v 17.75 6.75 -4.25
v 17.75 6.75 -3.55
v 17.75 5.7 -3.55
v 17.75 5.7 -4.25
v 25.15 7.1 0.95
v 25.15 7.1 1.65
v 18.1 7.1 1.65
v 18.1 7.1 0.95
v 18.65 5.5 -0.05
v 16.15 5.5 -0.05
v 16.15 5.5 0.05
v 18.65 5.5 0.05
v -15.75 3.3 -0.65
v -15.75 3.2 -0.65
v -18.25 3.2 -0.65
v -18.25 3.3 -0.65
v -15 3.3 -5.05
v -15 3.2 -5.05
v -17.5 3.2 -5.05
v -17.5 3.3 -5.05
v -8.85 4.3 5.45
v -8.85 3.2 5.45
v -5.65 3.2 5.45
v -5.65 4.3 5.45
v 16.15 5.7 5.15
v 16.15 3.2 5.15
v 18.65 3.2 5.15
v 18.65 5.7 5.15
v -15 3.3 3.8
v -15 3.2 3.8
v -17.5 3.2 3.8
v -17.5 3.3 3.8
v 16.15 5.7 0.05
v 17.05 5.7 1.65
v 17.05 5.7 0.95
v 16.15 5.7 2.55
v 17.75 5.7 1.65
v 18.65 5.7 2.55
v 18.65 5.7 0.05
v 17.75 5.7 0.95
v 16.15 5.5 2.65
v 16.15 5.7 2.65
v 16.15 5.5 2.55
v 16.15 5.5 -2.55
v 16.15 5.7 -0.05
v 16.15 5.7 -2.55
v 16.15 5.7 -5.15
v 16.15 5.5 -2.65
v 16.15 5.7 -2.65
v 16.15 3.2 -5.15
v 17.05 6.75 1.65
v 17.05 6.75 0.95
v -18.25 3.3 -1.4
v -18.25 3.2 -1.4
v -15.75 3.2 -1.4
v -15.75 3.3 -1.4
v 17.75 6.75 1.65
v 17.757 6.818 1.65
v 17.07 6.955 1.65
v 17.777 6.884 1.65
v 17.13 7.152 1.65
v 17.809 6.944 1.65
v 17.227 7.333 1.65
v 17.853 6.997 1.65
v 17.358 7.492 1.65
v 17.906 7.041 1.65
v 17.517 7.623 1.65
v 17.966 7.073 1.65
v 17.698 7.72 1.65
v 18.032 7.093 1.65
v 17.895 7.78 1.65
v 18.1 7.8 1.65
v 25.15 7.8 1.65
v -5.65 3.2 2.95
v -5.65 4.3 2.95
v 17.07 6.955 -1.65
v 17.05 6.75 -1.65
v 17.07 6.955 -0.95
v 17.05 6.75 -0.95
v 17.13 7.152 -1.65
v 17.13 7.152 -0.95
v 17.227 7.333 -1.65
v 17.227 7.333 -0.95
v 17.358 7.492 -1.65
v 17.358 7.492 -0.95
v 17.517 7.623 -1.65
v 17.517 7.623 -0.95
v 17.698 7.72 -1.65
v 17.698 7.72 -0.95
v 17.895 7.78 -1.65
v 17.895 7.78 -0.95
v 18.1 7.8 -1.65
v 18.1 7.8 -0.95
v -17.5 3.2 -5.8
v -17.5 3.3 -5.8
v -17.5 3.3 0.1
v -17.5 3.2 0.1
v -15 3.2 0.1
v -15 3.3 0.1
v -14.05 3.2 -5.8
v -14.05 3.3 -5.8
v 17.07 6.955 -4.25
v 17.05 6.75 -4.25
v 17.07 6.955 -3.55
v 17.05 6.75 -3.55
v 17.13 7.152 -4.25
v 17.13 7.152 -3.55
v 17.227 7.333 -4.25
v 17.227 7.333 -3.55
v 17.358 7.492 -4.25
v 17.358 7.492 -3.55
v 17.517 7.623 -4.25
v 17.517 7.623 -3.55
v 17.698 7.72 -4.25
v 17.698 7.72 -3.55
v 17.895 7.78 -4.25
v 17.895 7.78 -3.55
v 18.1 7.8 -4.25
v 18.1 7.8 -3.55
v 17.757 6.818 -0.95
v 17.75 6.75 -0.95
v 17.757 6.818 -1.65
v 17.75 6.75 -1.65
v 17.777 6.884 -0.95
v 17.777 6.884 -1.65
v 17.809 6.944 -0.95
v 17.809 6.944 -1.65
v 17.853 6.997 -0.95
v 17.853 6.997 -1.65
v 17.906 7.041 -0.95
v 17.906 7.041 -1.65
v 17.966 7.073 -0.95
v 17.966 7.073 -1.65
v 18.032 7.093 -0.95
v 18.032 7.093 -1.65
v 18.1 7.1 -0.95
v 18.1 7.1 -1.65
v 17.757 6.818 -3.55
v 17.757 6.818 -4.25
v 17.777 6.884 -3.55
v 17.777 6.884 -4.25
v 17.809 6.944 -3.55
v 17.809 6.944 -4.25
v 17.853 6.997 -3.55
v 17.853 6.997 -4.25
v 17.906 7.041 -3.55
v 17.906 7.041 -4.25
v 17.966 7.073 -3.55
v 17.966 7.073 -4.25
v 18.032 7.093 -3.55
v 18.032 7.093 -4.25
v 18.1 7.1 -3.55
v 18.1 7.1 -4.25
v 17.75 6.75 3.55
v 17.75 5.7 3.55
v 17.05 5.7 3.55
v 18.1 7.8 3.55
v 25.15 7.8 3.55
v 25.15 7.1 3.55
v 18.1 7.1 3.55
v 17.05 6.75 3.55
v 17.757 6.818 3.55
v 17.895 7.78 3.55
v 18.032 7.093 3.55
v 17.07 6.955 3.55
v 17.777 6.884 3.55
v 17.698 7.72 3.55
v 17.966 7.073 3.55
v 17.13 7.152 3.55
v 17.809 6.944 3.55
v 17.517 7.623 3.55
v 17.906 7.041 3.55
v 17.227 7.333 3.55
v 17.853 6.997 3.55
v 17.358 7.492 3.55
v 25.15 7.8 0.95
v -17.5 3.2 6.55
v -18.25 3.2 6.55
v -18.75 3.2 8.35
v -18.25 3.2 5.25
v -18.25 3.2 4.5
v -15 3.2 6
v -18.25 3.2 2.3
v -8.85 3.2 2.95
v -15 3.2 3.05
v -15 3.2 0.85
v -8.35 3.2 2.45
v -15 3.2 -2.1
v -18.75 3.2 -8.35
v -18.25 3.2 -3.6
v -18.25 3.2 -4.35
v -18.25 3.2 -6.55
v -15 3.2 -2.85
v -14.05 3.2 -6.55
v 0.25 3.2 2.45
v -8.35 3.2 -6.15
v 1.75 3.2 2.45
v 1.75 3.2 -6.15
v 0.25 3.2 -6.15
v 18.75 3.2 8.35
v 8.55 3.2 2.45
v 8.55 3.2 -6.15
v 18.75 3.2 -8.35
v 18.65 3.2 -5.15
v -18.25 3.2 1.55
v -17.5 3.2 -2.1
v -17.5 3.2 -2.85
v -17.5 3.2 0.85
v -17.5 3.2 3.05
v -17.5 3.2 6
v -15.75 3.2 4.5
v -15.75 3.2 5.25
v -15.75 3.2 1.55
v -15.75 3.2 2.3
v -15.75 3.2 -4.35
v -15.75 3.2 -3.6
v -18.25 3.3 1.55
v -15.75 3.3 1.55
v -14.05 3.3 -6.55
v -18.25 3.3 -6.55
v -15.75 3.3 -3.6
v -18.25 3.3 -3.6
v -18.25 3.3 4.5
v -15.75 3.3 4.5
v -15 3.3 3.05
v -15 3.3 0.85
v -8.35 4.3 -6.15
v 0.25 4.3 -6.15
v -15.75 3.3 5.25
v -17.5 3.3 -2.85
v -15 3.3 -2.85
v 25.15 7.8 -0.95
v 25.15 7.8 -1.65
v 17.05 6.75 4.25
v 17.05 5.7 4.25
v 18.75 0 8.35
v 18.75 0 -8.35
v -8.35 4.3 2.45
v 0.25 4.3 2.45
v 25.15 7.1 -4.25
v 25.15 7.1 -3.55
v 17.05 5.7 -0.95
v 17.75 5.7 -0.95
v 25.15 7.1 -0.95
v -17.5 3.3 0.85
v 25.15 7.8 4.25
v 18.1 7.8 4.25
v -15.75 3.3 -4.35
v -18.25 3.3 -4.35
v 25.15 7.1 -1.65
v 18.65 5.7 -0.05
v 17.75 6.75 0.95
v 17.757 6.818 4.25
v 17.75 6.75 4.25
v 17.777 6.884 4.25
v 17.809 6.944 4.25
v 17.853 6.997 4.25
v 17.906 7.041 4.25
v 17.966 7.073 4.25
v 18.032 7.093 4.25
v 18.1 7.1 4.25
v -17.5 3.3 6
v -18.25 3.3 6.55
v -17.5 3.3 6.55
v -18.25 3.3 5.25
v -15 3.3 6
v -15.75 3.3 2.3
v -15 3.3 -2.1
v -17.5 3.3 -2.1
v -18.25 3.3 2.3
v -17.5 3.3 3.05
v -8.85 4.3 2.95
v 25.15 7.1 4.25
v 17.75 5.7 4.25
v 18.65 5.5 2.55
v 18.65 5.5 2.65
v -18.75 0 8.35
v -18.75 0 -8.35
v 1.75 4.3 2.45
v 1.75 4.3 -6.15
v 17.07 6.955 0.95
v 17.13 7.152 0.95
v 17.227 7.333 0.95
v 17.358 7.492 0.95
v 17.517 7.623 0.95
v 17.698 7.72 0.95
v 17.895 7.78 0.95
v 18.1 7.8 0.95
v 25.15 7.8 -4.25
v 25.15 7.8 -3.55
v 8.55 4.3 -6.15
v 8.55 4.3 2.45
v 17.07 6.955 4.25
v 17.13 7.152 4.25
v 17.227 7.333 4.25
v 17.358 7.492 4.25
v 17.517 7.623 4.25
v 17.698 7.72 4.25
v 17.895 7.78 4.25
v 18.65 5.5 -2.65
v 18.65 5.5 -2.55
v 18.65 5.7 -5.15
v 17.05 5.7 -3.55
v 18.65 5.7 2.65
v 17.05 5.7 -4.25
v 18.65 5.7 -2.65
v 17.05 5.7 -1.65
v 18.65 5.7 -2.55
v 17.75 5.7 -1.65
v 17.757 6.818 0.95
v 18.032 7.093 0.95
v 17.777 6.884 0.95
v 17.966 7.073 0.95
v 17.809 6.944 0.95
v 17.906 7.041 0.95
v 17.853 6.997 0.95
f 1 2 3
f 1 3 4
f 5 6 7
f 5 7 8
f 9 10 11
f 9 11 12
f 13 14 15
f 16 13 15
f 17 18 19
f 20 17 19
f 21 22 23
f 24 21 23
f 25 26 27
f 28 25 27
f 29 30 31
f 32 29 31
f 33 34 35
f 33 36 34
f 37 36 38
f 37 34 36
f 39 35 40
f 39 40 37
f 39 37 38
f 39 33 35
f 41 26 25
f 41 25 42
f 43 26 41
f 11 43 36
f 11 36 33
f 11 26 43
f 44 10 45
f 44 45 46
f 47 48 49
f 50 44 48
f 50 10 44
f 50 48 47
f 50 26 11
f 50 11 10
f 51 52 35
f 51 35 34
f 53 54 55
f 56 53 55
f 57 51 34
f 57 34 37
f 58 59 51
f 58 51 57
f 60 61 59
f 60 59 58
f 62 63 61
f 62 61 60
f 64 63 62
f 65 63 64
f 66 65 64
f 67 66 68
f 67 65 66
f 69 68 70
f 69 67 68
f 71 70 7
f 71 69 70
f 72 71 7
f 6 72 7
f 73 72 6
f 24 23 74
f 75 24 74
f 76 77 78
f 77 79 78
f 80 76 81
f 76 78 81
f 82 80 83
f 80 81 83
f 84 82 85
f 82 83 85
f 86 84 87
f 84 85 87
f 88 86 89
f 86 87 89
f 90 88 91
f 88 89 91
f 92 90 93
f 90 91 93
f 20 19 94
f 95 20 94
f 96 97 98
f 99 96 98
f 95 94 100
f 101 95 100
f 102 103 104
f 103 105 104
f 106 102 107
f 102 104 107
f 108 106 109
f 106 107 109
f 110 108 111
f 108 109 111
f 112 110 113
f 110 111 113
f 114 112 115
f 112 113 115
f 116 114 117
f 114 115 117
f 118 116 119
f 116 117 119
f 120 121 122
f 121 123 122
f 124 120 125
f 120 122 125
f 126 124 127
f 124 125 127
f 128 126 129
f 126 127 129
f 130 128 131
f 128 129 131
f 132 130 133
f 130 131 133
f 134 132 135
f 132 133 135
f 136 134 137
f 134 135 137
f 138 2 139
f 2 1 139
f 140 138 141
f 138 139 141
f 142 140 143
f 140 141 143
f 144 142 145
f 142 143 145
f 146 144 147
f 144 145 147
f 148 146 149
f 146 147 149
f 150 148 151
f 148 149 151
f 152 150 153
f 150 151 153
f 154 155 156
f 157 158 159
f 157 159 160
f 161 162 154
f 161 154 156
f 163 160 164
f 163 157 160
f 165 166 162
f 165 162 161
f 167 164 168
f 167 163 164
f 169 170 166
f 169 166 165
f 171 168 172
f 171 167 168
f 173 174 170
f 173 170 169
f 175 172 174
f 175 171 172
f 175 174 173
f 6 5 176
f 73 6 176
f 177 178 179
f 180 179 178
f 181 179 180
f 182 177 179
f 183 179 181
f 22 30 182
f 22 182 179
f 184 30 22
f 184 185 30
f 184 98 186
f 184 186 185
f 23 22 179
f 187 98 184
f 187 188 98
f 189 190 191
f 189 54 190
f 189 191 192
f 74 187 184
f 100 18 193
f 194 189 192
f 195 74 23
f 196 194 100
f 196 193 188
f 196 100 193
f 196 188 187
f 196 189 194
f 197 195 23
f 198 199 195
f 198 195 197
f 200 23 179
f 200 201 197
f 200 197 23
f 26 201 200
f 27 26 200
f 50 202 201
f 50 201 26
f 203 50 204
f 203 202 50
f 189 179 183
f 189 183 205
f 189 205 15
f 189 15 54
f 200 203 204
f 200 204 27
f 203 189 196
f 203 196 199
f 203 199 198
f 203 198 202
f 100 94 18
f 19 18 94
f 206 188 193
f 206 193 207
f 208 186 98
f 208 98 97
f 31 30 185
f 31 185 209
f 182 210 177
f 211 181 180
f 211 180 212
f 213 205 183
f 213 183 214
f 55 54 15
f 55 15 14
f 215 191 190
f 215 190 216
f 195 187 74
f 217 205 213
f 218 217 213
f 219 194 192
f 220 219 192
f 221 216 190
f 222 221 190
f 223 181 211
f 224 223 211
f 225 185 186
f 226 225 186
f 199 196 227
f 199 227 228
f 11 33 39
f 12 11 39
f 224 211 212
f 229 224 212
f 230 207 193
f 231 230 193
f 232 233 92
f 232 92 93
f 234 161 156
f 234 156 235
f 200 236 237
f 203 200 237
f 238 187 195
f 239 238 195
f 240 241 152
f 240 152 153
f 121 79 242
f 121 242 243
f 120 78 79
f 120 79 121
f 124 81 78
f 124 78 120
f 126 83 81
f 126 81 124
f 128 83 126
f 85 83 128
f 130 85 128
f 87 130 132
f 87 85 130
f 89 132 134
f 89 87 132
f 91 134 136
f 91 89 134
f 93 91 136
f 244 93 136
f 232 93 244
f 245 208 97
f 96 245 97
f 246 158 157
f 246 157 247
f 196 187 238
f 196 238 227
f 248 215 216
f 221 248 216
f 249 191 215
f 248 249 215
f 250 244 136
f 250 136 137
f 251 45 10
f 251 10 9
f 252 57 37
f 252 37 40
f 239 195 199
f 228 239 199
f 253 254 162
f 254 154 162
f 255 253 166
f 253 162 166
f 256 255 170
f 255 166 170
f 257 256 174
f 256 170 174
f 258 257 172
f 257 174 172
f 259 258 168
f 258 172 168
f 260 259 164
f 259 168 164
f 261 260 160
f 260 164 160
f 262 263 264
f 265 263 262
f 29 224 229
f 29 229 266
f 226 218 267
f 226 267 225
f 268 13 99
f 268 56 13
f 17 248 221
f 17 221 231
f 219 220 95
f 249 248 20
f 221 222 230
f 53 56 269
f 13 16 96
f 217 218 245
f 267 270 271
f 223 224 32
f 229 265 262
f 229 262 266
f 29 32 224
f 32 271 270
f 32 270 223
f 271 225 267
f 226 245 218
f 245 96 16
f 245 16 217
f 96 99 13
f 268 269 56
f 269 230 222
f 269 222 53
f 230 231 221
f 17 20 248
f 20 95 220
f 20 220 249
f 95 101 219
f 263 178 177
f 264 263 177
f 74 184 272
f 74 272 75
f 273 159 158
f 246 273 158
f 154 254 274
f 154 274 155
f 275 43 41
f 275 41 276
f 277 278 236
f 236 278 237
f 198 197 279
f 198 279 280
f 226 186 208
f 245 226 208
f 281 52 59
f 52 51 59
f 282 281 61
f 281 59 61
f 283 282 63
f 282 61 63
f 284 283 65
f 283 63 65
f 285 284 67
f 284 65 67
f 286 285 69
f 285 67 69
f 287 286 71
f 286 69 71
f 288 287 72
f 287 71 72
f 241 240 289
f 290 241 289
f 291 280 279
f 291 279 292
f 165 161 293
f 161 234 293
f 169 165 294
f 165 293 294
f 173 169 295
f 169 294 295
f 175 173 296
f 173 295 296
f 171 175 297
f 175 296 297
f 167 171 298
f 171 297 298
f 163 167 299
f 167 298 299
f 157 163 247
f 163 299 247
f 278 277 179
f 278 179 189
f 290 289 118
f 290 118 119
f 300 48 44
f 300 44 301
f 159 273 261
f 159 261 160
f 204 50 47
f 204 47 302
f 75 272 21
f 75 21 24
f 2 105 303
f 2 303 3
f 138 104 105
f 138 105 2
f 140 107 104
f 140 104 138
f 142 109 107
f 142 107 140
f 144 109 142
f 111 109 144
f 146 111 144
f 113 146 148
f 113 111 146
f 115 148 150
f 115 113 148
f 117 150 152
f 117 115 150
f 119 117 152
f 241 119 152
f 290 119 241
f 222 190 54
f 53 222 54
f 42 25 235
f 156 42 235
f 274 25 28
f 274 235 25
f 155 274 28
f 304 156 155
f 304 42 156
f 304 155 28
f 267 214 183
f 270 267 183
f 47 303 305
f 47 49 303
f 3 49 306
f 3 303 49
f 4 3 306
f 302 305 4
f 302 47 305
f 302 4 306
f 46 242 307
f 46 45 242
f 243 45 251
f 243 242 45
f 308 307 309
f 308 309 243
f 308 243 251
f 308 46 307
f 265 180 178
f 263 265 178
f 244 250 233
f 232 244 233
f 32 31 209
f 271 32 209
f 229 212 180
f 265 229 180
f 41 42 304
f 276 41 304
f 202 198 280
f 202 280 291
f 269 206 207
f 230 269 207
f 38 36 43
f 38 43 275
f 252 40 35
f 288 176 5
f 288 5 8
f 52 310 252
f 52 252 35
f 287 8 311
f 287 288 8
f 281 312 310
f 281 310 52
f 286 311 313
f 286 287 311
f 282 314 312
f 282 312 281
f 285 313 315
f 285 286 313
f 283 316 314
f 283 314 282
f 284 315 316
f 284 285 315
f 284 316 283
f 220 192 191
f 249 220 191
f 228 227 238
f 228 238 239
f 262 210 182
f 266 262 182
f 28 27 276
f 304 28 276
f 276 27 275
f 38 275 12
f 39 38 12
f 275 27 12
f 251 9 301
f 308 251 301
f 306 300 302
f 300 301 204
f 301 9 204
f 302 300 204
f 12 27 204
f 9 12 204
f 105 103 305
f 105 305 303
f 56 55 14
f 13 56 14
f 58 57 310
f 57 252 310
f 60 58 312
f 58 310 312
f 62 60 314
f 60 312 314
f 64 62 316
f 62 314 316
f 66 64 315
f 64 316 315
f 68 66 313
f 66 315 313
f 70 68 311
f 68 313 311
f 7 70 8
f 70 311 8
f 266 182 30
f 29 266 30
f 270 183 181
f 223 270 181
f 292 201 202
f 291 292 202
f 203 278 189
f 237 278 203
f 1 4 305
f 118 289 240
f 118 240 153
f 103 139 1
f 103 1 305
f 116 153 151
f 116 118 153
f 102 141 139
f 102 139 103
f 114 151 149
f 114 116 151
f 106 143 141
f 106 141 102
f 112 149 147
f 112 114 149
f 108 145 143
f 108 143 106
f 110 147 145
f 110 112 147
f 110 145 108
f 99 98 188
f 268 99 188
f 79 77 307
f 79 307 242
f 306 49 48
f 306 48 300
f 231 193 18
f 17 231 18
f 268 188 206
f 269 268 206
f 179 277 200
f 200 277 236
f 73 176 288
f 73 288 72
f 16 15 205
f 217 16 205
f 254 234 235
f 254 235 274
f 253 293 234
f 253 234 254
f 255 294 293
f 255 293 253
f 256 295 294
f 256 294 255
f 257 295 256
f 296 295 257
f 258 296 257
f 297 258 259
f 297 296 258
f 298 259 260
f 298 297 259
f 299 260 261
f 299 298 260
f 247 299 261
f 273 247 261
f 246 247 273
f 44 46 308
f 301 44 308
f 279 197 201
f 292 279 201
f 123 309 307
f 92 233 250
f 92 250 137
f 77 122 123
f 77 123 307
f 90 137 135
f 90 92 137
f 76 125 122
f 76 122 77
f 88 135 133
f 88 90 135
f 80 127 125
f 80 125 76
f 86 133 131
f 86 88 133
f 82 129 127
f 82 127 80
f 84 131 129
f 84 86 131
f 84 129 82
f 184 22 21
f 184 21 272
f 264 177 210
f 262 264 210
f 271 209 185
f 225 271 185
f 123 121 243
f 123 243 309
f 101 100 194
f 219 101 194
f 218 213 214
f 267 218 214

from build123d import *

# Parameters (mm, degrees)
SKETCH1_W           = 37.5
SKETCH1_H           = 16.7
BOSS_EXTRUDE1_DEPTH = 3.2
SKETCH2_W           = 8.6
SKETCH2_H           = 8.6
SKETCH2_W_2         = 6.8
SKETCH2_W_3         = 3.2
SKETCH2_H_2         = 2.5
BOSS_EXTRUDE2_DEPTH = 1.1
BOSS_EXTRUDE3_DEPTH = 0.1
SKETCH4_W           = 2.5
SKETCH4_H           = 10.3
BOSS_EXTRUDE4_DEPTH = 2.5
SKETCH5_W           = 2.5
SKETCH5_H           = 0.1
CUT_EXTRUDE1_DEPTH  = 0.2
SKETCH6_W           = 0.7
SKETCH6_H           = 0.7


with BuildPart() as part:
    # Sketch1 → Boss-Extrude1 (new body)
    with BuildSketch(Plane(origin=(0, 0, 0), x_dir=(1, 0, 0), z_dir=(0, 1, 0))):
        Rectangle(SKETCH1_W, SKETCH1_H)
    extrude(amount=BOSS_EXTRUDE1_DEPTH)

    # Sketch2 → Boss-Extrude2 (add)
    with BuildSketch(Plane(origin=(0, 3.2, 0), x_dir=(1, 0, 0), z_dir=(0, 1, 0))):
        with Locations((-4.05, 1.85)):
            Rectangle(SKETCH2_W, SKETCH2_H)
        with Locations((5.15, 1.85)):
            Rectangle(SKETCH2_W_2, SKETCH2_H)
        with Locations((-7.25, -4.2)):
            Rectangle(SKETCH2_W_3, SKETCH2_H_2)
    extrude(amount=BOSS_EXTRUDE2_DEPTH)

    # Sketch3 → Boss-Extrude3 (add)
    with BuildSketch(Plane(origin=(0, 3.2, 0), x_dir=(1, 0, 0), z_dir=(0, 1, 0))):
        Polygon((-14.05, 6.55), (-18.25, 6.55), (-18.25, 4.35), (-15.75, 4.35), (-15.75, 3.6), (-18.25, 3.6), (-18.25, 1.4), (-15.75, 1.4), (-15.75, 0.65), (-18.25, 0.65), (-18.25, -1.55), (-15.75, -1.55), (-15.75, -2.3), (-18.25, -2.3), (-18.25, -4.5), (-15.75, -4.5), (-15.75, -5.25), (-18.25, -5.25), (-18.25, -6.55), (-17.5, -6.55), (-17.5, -6), (-15, -6), (-15, -3.8), (-17.5, -3.8), (-17.5, -3.05), (-15, -3.05), (-15, -0.85), (-17.5, -0.85), (-17.5, -0.1), (-15, -0.1), (-15, 2.1), (-17.5, 2.1), (-17.5, 2.85), (-15, 2.85), (-15, 5.05), (-17.5, 5.05), (-17.5, 5.8), (-14.05, 5.8), align=None)
    extrude(amount=BOSS_EXTRUDE3_DEPTH)

    # Sketch4 → Boss-Extrude4 (add)
    with BuildSketch(Plane(origin=(0, 3.2, 0), x_dir=(1, 0, 0), z_dir=(0, 1, 0))):
        with Locations((17.4, 0)):
            Rectangle(SKETCH4_W, SKETCH4_H)
    extrude(amount=BOSS_EXTRUDE4_DEPTH)

    # Sketch5 → Cut-Extrude1 (cut)
    with BuildSketch(Plane(origin=(0, 5.7, 0), x_dir=(1, 0, 0), z_dir=(0, 1, 0))):
        with Locations((17.4, 2.6)):
            Rectangle(SKETCH5_W, SKETCH5_H)
        with Locations((17.4, -2.6)):
            Rectangle(SKETCH5_W, SKETCH5_H)
        with Locations((17.4, 0)):
            Rectangle(SKETCH5_W, SKETCH5_H)
    extrude(amount=-CUT_EXTRUDE1_DEPTH, mode=Mode.SUBTRACT)

    # Sweep1: sweep along a path in Sketch7
    with BuildLine(Plane.XY) as sweep1_path:
        Line((17.4, 5.7), (17.4, 6.75))
        ThreePointArc((17.4, 6.75), (17.605025253, 7.244974747), (18.1, 7.45))
        Line((18.1, 7.45), (25.15, 7.45))
    # Sketch6 → Sweep1 (sweep)
    with BuildSketch(Plane(origin=(0, 5.7, 0), x_dir=(1, 0, 0), z_dir=(0, 1, 0))):
        with Locations((17.4, 3.9)):
            Rectangle(SKETCH6_W, SKETCH6_H)
        with Locations((17.4, 1.3)):
            Rectangle(SKETCH6_W, SKETCH6_H)
        with Locations((17.4, -1.3)):
            Rectangle(SKETCH6_W, SKETCH6_H)
        with Locations((17.4, -3.9)):
            Rectangle(SKETCH6_W, SKETCH6_H)
    sweep(path=sweep1_path.line)


solid = part.part
